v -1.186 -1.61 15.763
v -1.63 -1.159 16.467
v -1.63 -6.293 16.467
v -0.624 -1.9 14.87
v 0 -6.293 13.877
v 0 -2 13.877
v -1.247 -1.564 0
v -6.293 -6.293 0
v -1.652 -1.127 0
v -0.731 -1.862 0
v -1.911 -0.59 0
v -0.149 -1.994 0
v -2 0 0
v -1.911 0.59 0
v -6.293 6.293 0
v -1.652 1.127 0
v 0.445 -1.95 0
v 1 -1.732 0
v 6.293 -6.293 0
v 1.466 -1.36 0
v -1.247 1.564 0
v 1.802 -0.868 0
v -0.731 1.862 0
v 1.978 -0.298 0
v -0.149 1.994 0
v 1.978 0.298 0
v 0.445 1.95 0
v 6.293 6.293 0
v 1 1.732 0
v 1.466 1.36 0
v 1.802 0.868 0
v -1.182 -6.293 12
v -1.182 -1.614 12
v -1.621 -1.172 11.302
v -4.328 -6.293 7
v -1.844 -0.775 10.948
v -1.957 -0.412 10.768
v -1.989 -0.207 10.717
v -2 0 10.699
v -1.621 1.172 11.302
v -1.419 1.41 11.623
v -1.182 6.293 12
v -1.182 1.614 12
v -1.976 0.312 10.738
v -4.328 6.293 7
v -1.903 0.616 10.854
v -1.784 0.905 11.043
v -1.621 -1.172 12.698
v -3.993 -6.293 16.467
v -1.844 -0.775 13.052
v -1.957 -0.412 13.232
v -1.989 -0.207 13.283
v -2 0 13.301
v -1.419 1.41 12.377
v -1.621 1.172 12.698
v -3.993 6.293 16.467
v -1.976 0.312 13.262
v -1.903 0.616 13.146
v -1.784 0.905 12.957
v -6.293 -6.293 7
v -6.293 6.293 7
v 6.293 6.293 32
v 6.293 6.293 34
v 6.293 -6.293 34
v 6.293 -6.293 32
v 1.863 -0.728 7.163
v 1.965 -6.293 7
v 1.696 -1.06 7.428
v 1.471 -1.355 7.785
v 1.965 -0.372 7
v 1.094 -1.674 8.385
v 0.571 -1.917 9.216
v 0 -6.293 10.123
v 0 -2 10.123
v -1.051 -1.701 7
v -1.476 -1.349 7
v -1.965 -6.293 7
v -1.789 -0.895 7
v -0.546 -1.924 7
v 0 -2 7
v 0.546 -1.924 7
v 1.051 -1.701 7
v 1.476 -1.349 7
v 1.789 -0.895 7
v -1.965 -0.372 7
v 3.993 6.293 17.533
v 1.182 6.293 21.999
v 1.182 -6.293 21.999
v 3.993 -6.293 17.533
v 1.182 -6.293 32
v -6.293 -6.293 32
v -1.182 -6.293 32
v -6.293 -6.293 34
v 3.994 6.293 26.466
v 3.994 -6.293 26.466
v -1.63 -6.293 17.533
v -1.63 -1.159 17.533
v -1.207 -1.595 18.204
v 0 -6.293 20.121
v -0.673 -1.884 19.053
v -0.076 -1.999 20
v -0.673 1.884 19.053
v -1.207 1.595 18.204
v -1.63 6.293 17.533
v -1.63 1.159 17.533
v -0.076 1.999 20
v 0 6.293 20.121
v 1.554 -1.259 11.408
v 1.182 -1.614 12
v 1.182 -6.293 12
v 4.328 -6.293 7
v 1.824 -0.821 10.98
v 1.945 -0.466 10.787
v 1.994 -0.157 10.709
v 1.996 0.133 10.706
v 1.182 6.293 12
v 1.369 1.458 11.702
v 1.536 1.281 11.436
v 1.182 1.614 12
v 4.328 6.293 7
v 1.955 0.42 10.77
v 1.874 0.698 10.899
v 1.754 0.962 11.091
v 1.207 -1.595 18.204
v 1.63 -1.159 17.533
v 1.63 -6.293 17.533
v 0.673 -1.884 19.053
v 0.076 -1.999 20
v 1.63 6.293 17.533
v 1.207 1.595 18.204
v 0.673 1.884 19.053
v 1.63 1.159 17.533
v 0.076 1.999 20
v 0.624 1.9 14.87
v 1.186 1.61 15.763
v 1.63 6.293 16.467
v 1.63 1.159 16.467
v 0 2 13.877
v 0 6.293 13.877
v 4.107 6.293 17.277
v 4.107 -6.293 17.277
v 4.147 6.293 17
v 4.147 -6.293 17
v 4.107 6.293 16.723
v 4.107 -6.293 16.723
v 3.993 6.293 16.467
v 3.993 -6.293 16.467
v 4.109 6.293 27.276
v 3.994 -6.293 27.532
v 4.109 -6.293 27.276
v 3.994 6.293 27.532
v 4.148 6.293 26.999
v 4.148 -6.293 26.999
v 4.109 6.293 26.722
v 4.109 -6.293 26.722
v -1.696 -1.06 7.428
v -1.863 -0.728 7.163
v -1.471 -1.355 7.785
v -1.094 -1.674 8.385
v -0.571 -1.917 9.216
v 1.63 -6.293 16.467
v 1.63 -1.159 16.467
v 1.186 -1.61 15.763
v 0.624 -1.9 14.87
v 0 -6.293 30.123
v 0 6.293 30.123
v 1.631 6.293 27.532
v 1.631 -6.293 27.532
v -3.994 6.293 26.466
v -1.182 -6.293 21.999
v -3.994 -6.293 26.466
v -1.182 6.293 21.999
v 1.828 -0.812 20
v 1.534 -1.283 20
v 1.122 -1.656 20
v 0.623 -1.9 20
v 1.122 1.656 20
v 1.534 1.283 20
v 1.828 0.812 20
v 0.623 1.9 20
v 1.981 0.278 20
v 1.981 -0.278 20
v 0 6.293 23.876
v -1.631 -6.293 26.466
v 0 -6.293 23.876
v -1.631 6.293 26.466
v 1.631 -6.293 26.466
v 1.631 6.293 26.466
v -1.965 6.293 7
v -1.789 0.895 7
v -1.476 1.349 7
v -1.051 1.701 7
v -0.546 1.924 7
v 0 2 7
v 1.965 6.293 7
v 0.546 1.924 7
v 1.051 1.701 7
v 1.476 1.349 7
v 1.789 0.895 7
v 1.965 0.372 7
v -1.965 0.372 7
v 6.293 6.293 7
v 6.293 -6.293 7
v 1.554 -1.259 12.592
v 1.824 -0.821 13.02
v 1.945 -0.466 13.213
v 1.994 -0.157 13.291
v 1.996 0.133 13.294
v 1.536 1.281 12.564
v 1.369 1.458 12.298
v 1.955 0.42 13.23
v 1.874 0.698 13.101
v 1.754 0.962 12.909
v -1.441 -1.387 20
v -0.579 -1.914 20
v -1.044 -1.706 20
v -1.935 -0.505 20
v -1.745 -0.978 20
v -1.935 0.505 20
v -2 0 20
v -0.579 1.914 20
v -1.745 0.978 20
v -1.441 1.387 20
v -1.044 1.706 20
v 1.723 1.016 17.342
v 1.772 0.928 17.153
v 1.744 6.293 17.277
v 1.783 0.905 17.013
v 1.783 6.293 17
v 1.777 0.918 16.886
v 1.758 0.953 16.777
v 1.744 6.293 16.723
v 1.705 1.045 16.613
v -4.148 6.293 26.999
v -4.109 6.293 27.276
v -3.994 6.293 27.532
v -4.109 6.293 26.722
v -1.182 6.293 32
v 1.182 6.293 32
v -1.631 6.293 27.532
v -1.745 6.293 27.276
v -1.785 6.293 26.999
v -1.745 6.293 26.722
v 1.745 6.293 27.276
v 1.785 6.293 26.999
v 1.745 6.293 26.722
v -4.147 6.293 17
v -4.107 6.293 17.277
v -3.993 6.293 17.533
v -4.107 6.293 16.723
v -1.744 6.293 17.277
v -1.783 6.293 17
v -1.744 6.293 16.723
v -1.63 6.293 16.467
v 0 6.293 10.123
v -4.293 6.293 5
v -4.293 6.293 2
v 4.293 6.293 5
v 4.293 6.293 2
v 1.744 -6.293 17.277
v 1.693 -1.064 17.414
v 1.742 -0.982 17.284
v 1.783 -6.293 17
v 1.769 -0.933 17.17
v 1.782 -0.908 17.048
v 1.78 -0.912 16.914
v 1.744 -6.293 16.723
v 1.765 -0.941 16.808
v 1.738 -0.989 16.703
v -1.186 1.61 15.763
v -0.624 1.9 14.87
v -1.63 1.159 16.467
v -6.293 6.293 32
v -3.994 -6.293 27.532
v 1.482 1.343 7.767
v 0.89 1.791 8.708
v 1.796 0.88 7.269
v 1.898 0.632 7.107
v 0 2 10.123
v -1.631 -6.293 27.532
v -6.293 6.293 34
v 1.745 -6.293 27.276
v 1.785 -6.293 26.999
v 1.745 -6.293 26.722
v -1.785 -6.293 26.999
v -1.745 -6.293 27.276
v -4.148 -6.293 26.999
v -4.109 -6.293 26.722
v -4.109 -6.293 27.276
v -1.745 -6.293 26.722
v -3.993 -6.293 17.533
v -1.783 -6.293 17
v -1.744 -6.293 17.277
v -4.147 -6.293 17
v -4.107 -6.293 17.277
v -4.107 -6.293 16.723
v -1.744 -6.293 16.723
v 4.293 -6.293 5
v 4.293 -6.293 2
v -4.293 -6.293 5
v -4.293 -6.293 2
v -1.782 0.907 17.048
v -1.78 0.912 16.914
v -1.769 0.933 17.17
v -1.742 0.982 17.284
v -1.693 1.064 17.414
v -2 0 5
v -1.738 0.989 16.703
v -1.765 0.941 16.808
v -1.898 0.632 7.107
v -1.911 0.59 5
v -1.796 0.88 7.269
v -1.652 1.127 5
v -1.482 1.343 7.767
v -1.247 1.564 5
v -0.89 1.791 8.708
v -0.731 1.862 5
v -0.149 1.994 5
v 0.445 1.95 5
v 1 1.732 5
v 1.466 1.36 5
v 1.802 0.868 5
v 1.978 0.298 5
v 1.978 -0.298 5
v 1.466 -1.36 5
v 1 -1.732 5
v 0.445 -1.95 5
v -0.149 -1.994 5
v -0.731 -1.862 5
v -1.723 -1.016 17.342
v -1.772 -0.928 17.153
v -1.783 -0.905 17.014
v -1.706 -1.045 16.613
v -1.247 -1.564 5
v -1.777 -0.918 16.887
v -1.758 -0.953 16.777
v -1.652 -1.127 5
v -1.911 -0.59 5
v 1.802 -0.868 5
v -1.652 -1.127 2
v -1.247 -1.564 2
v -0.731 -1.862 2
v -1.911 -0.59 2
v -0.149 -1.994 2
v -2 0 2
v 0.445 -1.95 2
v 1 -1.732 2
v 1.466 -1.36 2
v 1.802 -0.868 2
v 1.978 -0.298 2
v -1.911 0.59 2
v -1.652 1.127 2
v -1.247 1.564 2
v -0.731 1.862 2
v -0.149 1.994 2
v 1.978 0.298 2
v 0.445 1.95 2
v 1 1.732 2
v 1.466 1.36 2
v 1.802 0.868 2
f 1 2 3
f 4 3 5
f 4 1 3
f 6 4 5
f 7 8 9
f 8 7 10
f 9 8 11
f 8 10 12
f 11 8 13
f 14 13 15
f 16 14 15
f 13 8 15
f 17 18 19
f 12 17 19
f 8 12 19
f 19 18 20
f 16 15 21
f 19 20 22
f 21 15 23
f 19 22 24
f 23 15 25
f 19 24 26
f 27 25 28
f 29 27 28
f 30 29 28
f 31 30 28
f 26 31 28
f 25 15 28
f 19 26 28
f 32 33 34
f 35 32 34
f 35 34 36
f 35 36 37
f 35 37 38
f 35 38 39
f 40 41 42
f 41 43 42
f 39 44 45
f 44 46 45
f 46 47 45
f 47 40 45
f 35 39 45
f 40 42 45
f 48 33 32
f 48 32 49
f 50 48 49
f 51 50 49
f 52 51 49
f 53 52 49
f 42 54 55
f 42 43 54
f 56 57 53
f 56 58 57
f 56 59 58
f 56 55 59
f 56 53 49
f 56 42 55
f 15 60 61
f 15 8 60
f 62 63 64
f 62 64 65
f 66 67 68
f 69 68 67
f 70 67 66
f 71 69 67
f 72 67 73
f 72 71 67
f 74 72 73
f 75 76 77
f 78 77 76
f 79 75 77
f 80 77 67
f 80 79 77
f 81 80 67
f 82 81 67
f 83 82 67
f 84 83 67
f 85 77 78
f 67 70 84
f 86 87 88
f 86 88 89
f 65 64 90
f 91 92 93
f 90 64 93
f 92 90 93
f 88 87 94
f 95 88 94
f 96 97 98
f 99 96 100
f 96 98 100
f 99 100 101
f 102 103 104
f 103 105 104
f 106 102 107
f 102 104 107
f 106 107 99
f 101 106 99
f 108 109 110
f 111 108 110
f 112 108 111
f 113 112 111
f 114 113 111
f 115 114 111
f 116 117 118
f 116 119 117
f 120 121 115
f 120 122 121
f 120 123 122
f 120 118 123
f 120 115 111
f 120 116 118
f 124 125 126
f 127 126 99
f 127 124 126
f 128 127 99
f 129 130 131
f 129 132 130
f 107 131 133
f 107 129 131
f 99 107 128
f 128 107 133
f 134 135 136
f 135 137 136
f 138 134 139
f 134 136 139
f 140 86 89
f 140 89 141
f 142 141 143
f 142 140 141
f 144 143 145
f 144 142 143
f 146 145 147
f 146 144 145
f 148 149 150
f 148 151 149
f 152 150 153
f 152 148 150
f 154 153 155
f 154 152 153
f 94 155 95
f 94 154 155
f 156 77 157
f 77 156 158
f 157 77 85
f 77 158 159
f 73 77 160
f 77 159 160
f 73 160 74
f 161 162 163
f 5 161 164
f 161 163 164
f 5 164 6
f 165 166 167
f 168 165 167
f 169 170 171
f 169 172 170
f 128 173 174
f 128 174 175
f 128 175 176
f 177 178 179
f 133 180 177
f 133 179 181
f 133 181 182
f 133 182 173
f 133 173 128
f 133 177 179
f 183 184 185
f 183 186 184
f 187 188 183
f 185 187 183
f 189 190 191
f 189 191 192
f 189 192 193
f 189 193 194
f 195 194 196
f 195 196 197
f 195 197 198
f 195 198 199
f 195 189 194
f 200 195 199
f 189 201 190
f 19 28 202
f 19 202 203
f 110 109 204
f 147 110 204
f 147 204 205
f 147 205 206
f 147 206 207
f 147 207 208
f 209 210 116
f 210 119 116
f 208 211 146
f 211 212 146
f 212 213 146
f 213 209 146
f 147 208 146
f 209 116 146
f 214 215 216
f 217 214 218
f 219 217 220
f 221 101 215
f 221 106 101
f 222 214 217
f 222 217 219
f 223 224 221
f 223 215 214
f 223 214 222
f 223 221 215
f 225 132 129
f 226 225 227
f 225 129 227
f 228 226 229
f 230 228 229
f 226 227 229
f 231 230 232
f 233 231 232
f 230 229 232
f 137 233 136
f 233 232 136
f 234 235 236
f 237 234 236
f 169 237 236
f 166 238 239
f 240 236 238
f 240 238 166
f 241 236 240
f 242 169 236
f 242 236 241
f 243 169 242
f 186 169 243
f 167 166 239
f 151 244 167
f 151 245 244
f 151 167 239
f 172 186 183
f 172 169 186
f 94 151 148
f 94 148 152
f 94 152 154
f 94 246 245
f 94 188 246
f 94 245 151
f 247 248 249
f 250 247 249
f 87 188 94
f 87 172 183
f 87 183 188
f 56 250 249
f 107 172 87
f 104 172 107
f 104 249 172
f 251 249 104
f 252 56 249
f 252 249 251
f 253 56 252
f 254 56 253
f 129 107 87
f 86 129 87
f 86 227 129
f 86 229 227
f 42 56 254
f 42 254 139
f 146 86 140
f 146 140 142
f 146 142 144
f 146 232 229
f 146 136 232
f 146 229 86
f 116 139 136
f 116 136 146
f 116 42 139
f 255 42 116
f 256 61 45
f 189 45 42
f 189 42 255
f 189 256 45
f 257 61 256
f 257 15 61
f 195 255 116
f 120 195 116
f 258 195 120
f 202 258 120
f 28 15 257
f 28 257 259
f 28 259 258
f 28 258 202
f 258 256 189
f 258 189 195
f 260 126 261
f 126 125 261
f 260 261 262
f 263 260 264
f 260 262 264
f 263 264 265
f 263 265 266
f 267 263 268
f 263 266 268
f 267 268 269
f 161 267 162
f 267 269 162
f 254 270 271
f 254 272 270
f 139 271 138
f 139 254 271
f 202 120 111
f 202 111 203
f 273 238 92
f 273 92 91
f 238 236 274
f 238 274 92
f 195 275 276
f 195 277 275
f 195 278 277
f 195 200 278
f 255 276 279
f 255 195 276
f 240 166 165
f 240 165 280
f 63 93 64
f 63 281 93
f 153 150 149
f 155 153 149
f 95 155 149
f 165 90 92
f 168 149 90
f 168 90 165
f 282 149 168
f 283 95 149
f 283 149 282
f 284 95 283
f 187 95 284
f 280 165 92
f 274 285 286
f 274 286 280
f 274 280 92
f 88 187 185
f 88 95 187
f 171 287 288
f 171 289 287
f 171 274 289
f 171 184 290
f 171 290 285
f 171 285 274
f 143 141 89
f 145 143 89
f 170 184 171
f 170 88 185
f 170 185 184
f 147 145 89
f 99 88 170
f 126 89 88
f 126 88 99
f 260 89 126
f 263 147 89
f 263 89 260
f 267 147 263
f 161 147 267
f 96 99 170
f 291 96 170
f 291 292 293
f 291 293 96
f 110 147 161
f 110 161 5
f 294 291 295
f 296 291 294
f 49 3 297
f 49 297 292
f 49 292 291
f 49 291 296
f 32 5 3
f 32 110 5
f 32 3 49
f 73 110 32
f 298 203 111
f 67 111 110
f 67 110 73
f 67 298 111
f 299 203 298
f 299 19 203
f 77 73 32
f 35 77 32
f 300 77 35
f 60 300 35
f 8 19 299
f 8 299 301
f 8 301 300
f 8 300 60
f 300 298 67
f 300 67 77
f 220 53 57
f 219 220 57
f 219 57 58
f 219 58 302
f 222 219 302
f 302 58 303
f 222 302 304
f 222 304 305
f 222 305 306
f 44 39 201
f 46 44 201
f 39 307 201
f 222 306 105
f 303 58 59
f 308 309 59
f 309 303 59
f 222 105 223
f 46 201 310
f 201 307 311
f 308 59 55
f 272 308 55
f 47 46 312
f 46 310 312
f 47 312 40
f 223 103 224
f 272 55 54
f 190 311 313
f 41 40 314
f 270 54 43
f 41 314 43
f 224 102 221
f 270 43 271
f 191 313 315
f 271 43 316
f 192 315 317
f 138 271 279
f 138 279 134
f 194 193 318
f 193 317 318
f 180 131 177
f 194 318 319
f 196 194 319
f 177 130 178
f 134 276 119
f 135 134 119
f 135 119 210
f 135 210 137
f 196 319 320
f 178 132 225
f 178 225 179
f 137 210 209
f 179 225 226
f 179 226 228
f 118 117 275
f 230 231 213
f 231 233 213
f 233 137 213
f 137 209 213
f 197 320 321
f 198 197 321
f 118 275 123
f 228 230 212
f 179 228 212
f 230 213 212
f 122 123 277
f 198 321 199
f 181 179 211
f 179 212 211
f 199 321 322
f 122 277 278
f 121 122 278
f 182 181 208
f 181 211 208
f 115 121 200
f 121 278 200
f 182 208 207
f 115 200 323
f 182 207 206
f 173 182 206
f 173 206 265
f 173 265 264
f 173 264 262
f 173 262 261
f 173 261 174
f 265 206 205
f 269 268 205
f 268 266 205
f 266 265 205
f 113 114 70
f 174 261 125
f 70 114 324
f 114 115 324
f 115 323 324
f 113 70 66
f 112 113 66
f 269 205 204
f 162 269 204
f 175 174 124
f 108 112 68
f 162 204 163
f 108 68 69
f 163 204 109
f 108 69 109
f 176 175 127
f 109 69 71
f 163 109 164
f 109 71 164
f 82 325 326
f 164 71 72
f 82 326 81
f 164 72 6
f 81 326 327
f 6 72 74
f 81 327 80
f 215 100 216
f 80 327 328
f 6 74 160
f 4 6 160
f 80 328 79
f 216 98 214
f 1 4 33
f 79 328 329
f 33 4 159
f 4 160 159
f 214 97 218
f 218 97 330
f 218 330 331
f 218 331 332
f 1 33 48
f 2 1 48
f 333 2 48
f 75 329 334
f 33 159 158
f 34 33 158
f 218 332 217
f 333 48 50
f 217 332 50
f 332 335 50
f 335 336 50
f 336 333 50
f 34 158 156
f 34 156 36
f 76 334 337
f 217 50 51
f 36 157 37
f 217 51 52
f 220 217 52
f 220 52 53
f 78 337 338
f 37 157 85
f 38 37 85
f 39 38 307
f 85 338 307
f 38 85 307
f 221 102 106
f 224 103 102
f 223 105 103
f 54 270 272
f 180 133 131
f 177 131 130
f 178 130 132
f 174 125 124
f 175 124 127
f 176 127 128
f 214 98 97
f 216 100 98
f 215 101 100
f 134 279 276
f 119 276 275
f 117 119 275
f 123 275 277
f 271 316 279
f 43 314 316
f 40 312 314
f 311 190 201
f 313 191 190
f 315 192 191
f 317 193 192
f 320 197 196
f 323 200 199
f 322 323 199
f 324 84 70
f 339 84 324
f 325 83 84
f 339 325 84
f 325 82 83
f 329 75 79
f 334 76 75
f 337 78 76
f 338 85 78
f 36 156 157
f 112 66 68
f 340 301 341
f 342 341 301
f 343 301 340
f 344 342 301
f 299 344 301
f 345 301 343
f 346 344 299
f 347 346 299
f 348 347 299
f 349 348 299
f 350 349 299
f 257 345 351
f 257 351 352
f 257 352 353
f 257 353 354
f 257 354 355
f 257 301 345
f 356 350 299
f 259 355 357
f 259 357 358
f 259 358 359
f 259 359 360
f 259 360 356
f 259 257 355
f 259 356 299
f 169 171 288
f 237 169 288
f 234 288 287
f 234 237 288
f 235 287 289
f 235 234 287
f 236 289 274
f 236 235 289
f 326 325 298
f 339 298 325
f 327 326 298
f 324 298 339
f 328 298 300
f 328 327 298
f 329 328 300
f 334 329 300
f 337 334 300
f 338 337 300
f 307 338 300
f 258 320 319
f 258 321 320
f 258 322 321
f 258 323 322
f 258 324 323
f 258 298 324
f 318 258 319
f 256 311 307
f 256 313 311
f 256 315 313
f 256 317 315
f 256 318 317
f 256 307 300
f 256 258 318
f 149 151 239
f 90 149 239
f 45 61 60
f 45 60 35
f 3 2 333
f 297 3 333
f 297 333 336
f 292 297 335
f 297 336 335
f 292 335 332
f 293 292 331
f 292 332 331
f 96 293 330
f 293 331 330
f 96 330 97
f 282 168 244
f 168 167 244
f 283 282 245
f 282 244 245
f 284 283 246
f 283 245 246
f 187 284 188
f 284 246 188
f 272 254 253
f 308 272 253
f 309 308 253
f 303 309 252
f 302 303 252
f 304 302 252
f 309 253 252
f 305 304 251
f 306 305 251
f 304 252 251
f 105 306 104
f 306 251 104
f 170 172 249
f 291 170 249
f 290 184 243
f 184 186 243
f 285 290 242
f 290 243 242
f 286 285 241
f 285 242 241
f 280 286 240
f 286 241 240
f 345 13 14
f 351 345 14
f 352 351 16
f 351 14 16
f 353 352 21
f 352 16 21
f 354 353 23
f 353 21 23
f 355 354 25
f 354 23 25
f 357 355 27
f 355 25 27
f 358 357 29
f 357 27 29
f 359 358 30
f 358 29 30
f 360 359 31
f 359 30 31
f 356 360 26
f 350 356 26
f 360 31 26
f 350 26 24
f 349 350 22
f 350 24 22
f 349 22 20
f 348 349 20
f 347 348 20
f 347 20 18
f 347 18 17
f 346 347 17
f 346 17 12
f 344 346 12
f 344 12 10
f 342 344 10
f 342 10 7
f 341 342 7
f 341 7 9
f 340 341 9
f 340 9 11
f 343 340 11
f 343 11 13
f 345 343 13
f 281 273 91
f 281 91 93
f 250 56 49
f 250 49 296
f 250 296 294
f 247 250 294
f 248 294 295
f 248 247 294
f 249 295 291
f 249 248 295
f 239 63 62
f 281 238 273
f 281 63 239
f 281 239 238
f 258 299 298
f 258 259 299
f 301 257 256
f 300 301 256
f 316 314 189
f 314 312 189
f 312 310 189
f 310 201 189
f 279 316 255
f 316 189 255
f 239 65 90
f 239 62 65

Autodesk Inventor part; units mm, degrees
ref_plane "YZ Plane" through (0, 0, 0) normal (1, 0, 0) x (0, 1, 0)
ref_plane "XZ Plane" through (0, 0, 0) normal (0, 1, 0) x (-1, 0, 0)
ref_plane "XY Plane" through (0, 0, 0) normal (0, 0, 1) x (1, 0, 0)
sketch "Boceto1" plane through (0, 0, 0) normal (0, 0, 1) x (1, 0, 0)
  circle A0 centre (0, 0) radius 8.9
  line L0 (6.2933, -6.2933) -> (-6.2933, -6.2933)
  line L1 (-6.2933, -6.2933) -> (-6.2933, 6.2933)
  line L2 (-6.2933, 6.2933) -> (6.2933, 6.2933)
  line L3 (6.2933, 6.2933) -> (6.2933, -6.2933)
  dimension "d0" = 17.8
  dimension "d1" = 12.5865
  dimension "d2" = 12.5865
extrude "Extrusión1" add sketch "Boceto1" along normal blind 32 contours L3 L0 L1 L2
sketch "Boceto3" plane through (0, 0, 0) normal (0, 0, -1) x (-1, 0, 0)
  circle A0 centre (0, 0) radius 2
  dimension "d25" = 4
extrude "Extrusión3" cut sketch "Boceto3" against normal blind 20
sketch "Boceto4" plane through (0, 0, 0) normal (0, 1, 0) x (-1, 0, 0)
  line L0 (-6.2933, 0) -> (6.2933, 0) projected
  line L1 (-6.2933, 0) -> (6.2933, 0)
  line L2 (6.2933, 0) -> (6.2933, 2)
  line L3 (6.2933, 2) -> (-6.2933, 2)
  line L4 (-6.2933, 2) -> (-6.2933, 0)
  line L5 (-6.2933, 0) -> (-4.2933, 0)
  line L6 (-4.2933, 0) -> (-4.2933, 5)
  line L7 (-4.2933, 5) -> (-6.2933, 5)
  line L8 (-6.2933, 5) -> (-6.2933, 0)
  line L9 (6.2933, 0) -> (4.2933, 0)
  line L10 (4.2933, 0) -> (4.2933, 5)
  line L11 (4.2933, 5) -> (6.2933, 5)
  line L12 (6.2933, 5) -> (6.2933, 0)
  line L13 (-6.2933, 5) -> (6.2933, 5)
  line L14 (6.2933, 5) -> (6.2933, 7)
  line L15 (6.2933, 7) -> (-6.2933, 7)
  line L16 (-6.2933, 7) -> (-6.2933, 5)
  line L17 (0, 7) -> (6.2933, 7)
  line L18 (0, 7) -> (-6.2933, 7)
  line L19 (3.1484, 5.1198) -> (-3.993, 16.4674)
  line L20 (-4.8411, 17.815) -> (-3.9947, 18.3476)
  line L21 (4.8411, 6.185) -> (3.1484, 5.1198)
  line L22 (-5.1073, 15.7625) -> (-3.4147, 14.697)
  line L23 (3.9942, 27.532) -> (-0.0773, 34)
  line L24 (-3.4155, 39.303) -> (-5.1081, 38.2376)
  line L25 (-6.2933, 32) -> (6.2933, 32) projected
  line L26 (-6.2933, 32) -> (6.2933, 32)
  line L27 (6.2933, 32) -> (6.2933, 34)
  line L28 (6.2933, 34) -> (-6.2933, 34)
  line L29 (-6.2933, 34) -> (-6.2933, 32)
  line L30 (-1.6298, 16.4672) -> (4.8411, 6.185)
  line L31 (-1.6297, 17.5326) -> (3.9942, 26.4665)
  line L32 (-2.4406, 34) -> (1.6309, 27.532)
  line L33 (-2.4406, 34) -> (-0.0773, 34)
  line L34 (1.6309, 26.4665) -> (-3.9929, 17.5327)
  line L35 (0, 0) -> (0, -2)
  arc A0 (-1.6297, 17.5326) -> (-1.6298, 16.4672) centre (-0.7834, 16.9999) ccw
  arc A1 (-3.9929, 17.5327) -> (-3.993, 16.4674) centre (-3.1466, 17) ccw
  arc A2 (1.6309, 26.4665) -> (1.6309, 27.532) centre (0.7846, 26.9993) ccw
  arc A3 (3.9942, 26.4665) -> (3.9942, 27.532) centre (3.1479, 26.9993) ccw
  line L36 (-3.1484, 5.1198) -> (3.993, 16.4674)
  line L37 (-4.8411, 6.185) -> (-3.1484, 5.1198)
  line L38 (-3.9942, 27.532) -> (0.0773, 34)
  line L39 (1.6298, 16.4672) -> (-4.8411, 6.185)
  line L40 (1.6297, 17.5326) -> (-3.9942, 26.4665)
  line L41 (2.4406, 34) -> (-1.6309, 27.532)
  line L42 (2.4406, 34) -> (0.0773, 34)
  line L43 (-1.6309, 26.4665) -> (3.9929, 17.5327)
  arc A4 (1.6298, 16.4672) -> (1.6297, 17.5326) centre (0.7834, 16.9999) ccw
  arc A5 (3.993, 16.4674) -> (3.9929, 17.5327) centre (3.1466, 17) ccw
  arc A6 (-1.6309, 27.532) -> (-1.6309, 26.4665) centre (-0.7846, 26.9993) ccw
  arc A7 (-3.9942, 27.532) -> (-3.9942, 26.4665) centre (-3.1479, 26.9993) ccw
  point P0 (3.1466, 7)
  point P1 (-3.1466, 7)
  point P2 (0.0009, 22)
  point P3 (0, 32)
  point P4 (3.4147, 14.697)
  point P5 (-0.0009, 22)
  point P6 (3.9947, 18.3476)
  point P7 (-4.2933, 2)
  point P8 (4.2933, 2)
  point P9 (0, 10.1225)
  point P10 (1.9651, 7)
  point P11 (-1.9651, 7)
  point P12 (0, 13.8775)
  point P13 (0, 20.1215)
  point P14 (0, 30.1229)
  point P15 (0, 23.8757)
  point P16 (4.3282, 7)
  point P17 (1.1815, 12)
  point P18 (1.1816, 21.9986)
  point P19 (1.1816, 32)
  point P20 (-1.1816, 32)
  point P21 (-1.1816, 21.9986)
  point P22 (-1.1815, 12)
  point P23 (-4.3282, 7)
  dimension "d28" = 2
  dimension "d29" = 2
  dimension "d30" = 5
  dimension "d31" = 2
  dimension "d32" = 5
  dimension "d33" = 2
  dimension "d36" = 15
  dimension "d44" = 2
  dimension "d45" = 2
  dimension "d46" = 1
extrude "Extrusión4" cut sketch "Boceto4" against normal mid plane 100 contours L4 L3 L6 L0 | L6 L3 L10 L0 | L8 L7 L6 L3 | L16 L15 L39 L37 L36 L19 L21 L30 L14 L11 L13 L7 | L10 L3 L2 L0 | L10 L11 L12 L3 | L39 L19 L36 L15 | L15 L36 L37 L39 | L39 L30 L36 L19 | L19 A1 L34 L40 L31 A0 L30 L39 | L36 L30 L15 L19 | L39 A4 L40 L31 L43 A5 L36 L30 | L30 L21 L19 L15 | L40 A7 L38 L32 L41 A6 L43 L34 | L34 L43 L31 L40 | L34 A2 L32 L41 L23 A3 L31 L43 | L38 L23 L25 | L25 L29 L28 L32 | L25 L41 L32 | L32 L28 L23 L38 | L41 L28 L27 L25 | L23 L38 L28 L41 | L23 L28 L38 keep common part
extrude "Extrusión5" add sketch "Boceto4" along normal mid plane 12.5865 contours L38 L23 L25 | L25 L29 L28 L32 | L32 L28 L23 L38 | L41 L28 L27 L25 | L23 L38 L28 L41 | L23 L28 L38
properties part number "_3DPrint"
